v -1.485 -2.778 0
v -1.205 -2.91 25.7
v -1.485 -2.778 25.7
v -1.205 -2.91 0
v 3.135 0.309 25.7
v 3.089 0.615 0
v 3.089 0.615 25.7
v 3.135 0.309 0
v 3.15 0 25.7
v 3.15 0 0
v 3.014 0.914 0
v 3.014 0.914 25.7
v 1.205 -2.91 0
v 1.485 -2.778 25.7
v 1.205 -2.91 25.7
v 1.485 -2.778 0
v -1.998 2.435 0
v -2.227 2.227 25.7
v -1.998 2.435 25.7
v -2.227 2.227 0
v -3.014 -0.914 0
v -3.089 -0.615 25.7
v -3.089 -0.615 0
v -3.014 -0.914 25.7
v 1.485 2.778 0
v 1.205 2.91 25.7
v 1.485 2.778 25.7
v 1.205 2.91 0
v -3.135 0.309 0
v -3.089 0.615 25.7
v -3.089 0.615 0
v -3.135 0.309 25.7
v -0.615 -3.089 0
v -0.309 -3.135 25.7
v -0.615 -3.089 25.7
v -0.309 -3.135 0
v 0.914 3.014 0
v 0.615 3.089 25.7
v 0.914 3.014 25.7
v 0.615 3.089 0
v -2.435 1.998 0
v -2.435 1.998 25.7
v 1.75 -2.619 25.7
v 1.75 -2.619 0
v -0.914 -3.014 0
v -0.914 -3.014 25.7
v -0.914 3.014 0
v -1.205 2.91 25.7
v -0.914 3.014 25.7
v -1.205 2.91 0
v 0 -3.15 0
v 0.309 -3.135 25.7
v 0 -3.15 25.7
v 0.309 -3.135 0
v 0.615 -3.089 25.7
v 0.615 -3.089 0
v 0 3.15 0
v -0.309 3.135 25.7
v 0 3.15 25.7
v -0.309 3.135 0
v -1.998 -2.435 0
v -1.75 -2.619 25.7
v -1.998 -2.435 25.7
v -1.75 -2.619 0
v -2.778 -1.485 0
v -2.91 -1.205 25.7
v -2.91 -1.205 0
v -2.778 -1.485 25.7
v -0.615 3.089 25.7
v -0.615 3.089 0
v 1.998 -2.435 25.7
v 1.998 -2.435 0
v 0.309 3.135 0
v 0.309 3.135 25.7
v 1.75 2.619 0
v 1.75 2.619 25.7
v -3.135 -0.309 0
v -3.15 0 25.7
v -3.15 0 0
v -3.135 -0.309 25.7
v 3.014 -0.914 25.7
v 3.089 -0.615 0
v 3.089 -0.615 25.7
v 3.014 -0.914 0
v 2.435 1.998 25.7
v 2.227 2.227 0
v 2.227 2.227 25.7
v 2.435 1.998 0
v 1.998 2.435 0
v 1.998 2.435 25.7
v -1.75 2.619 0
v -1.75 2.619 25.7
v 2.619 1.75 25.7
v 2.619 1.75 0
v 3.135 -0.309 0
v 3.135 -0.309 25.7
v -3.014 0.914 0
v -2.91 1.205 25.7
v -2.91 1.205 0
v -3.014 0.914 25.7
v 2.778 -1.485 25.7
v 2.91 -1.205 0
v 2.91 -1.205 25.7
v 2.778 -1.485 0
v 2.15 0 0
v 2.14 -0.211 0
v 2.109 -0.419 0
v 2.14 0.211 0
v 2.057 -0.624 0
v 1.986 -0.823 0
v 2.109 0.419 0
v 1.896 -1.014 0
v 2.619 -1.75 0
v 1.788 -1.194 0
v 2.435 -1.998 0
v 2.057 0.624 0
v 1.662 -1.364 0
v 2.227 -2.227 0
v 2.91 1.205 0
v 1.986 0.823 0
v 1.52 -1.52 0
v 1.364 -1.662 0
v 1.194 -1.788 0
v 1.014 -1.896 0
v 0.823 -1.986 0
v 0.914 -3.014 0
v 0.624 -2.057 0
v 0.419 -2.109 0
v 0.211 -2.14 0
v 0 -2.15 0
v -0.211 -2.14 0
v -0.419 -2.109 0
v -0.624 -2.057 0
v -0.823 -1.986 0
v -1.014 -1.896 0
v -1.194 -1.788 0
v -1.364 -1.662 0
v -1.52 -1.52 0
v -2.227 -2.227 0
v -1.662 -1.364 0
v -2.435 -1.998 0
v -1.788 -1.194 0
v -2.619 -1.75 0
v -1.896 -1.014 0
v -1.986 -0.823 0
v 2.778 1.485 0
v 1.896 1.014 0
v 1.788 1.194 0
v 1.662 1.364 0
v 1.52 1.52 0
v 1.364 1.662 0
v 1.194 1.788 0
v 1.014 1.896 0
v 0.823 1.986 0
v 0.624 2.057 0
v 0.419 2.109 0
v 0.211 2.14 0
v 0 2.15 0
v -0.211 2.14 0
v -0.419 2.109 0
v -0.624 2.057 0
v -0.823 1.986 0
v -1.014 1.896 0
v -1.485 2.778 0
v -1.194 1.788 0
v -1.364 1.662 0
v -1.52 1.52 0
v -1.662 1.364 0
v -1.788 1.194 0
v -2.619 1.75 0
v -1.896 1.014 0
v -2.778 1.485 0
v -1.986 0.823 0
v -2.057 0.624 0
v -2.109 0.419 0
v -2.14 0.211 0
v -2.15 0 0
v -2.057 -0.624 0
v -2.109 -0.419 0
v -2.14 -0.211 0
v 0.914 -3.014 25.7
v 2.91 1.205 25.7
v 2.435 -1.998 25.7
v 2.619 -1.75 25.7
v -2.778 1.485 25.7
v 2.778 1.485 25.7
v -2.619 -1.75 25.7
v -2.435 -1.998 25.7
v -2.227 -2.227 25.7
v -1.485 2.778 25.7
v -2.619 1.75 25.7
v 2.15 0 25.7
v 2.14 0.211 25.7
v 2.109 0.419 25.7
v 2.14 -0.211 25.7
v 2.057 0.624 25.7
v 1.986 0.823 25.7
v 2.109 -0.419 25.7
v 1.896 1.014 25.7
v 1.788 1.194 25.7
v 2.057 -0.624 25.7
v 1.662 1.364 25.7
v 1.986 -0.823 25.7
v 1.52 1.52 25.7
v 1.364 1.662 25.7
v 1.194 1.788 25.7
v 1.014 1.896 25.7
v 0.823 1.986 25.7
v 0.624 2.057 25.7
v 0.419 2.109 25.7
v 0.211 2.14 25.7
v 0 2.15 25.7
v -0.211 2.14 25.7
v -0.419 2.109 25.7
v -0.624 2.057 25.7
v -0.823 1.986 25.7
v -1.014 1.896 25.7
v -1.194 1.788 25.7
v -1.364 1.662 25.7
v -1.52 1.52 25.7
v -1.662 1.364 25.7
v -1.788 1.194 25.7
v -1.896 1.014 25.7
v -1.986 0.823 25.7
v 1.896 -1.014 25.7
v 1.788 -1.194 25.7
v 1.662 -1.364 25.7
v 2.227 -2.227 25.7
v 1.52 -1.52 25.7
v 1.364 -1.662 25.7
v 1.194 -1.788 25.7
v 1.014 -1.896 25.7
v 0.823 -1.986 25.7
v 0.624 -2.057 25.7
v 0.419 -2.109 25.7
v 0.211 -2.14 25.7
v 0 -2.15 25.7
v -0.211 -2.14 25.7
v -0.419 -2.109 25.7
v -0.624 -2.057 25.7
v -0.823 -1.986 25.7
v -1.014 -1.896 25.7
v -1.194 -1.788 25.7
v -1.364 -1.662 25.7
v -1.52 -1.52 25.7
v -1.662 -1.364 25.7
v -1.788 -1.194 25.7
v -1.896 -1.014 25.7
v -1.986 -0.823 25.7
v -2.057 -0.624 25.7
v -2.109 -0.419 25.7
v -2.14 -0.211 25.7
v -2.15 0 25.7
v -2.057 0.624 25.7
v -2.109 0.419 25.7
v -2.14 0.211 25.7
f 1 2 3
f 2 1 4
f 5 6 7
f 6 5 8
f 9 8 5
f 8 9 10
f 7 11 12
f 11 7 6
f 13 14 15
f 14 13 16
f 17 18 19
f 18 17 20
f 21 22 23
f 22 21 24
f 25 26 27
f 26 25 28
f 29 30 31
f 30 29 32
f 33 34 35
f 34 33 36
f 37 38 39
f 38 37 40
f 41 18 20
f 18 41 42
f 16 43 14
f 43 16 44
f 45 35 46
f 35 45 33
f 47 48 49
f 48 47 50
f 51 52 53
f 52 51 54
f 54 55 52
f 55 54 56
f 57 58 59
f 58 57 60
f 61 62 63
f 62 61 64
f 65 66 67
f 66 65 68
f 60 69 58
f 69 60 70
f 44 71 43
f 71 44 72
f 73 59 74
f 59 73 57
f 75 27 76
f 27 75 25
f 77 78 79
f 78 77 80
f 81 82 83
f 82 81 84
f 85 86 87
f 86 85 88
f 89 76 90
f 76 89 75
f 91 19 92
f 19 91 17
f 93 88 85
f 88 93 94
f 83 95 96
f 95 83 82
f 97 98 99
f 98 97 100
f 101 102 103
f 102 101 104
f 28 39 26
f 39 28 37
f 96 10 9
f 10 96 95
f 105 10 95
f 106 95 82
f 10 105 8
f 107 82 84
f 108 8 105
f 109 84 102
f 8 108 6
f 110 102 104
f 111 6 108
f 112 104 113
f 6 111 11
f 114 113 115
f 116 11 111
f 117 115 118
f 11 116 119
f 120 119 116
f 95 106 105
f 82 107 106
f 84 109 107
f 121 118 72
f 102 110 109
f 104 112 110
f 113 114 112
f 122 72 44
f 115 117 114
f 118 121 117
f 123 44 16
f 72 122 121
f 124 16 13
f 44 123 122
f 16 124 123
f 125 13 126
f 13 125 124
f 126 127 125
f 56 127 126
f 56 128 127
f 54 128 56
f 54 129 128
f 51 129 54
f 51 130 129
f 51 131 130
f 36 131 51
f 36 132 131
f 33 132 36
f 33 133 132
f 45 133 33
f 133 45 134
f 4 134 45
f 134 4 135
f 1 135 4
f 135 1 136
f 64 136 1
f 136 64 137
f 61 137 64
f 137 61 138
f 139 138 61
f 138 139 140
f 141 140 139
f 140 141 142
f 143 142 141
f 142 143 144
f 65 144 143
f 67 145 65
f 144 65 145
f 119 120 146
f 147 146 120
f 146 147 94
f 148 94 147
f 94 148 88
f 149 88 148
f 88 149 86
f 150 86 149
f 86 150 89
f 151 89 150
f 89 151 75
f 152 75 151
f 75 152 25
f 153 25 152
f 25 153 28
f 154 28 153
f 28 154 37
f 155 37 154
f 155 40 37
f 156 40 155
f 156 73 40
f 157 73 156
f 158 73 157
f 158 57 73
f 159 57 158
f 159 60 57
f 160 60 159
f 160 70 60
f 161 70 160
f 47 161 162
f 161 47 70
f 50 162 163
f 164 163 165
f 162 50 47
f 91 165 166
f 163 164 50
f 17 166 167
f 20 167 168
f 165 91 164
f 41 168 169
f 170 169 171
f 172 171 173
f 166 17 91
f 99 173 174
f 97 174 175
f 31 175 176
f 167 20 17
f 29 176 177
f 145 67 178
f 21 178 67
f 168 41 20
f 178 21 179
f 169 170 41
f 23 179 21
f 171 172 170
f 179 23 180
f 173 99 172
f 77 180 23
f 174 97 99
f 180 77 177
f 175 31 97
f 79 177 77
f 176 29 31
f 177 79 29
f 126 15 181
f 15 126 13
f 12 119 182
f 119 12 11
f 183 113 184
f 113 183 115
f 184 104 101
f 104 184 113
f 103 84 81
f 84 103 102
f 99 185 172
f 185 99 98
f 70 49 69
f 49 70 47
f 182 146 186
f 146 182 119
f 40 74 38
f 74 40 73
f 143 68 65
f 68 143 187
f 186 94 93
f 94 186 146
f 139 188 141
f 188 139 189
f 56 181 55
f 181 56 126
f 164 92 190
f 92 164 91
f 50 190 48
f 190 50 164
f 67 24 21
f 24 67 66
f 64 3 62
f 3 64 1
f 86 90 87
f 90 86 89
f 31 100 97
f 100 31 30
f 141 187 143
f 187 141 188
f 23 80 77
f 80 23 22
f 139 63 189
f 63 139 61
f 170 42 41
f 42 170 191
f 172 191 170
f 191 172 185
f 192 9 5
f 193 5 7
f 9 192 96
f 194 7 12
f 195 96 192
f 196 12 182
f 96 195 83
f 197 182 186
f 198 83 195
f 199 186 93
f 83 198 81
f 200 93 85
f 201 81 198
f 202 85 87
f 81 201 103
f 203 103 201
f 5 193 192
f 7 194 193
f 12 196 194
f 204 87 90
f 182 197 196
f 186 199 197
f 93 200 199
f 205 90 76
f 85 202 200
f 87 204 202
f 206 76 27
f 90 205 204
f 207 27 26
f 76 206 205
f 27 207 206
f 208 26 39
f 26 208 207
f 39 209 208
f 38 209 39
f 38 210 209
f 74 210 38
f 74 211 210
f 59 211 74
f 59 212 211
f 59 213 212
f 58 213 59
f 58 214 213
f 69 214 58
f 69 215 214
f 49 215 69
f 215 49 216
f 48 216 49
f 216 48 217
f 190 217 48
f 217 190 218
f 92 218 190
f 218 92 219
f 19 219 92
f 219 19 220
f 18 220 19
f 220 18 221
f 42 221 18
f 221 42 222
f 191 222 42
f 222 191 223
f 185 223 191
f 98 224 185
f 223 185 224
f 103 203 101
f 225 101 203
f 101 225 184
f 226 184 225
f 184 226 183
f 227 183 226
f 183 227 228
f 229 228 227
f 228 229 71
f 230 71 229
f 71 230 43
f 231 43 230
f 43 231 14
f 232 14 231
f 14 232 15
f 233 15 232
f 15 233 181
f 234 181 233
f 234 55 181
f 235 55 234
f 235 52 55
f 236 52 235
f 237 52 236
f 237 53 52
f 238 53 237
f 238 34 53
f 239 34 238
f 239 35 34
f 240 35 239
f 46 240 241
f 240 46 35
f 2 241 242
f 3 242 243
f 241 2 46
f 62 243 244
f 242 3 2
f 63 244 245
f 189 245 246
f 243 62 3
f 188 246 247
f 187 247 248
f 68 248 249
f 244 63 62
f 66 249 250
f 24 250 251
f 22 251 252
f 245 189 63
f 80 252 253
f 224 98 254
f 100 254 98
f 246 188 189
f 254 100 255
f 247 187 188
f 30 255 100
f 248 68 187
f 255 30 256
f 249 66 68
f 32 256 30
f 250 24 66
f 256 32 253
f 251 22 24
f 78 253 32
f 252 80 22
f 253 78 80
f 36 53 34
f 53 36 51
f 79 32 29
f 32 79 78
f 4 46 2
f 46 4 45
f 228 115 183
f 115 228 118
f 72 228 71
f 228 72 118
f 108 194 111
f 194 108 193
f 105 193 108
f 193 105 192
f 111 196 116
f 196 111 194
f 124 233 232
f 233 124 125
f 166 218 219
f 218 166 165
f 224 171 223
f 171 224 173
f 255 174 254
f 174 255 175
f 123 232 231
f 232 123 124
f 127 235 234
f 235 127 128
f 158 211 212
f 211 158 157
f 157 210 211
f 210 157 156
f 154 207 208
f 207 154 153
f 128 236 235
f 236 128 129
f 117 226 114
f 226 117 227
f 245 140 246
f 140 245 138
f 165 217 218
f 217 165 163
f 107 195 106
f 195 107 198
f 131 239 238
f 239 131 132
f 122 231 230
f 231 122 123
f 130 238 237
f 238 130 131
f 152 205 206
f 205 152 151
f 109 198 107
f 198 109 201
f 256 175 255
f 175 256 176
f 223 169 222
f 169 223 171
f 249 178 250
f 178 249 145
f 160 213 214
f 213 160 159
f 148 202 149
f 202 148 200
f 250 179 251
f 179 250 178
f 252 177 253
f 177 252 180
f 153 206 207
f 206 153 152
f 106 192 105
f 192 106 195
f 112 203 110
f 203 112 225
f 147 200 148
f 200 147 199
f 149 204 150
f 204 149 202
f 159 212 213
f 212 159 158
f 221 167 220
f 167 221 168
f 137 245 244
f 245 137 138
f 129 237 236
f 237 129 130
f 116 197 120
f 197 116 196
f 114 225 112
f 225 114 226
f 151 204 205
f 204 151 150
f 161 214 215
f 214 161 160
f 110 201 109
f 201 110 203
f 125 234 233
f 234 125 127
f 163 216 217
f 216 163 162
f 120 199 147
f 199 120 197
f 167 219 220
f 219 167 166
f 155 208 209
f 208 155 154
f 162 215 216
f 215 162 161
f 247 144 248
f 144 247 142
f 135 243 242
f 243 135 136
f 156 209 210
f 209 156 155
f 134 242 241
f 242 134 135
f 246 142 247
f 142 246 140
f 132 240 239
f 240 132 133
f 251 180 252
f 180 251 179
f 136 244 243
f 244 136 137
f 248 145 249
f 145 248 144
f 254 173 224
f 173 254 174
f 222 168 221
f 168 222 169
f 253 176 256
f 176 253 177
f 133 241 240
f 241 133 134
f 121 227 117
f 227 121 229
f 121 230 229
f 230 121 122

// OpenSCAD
difference() {
    cylinder(h=25.7, d=6.3, $fn=64);
    translate([0, 0, -1])
        cylinder(h=27.7, d=4.3, $fn=64);
}
